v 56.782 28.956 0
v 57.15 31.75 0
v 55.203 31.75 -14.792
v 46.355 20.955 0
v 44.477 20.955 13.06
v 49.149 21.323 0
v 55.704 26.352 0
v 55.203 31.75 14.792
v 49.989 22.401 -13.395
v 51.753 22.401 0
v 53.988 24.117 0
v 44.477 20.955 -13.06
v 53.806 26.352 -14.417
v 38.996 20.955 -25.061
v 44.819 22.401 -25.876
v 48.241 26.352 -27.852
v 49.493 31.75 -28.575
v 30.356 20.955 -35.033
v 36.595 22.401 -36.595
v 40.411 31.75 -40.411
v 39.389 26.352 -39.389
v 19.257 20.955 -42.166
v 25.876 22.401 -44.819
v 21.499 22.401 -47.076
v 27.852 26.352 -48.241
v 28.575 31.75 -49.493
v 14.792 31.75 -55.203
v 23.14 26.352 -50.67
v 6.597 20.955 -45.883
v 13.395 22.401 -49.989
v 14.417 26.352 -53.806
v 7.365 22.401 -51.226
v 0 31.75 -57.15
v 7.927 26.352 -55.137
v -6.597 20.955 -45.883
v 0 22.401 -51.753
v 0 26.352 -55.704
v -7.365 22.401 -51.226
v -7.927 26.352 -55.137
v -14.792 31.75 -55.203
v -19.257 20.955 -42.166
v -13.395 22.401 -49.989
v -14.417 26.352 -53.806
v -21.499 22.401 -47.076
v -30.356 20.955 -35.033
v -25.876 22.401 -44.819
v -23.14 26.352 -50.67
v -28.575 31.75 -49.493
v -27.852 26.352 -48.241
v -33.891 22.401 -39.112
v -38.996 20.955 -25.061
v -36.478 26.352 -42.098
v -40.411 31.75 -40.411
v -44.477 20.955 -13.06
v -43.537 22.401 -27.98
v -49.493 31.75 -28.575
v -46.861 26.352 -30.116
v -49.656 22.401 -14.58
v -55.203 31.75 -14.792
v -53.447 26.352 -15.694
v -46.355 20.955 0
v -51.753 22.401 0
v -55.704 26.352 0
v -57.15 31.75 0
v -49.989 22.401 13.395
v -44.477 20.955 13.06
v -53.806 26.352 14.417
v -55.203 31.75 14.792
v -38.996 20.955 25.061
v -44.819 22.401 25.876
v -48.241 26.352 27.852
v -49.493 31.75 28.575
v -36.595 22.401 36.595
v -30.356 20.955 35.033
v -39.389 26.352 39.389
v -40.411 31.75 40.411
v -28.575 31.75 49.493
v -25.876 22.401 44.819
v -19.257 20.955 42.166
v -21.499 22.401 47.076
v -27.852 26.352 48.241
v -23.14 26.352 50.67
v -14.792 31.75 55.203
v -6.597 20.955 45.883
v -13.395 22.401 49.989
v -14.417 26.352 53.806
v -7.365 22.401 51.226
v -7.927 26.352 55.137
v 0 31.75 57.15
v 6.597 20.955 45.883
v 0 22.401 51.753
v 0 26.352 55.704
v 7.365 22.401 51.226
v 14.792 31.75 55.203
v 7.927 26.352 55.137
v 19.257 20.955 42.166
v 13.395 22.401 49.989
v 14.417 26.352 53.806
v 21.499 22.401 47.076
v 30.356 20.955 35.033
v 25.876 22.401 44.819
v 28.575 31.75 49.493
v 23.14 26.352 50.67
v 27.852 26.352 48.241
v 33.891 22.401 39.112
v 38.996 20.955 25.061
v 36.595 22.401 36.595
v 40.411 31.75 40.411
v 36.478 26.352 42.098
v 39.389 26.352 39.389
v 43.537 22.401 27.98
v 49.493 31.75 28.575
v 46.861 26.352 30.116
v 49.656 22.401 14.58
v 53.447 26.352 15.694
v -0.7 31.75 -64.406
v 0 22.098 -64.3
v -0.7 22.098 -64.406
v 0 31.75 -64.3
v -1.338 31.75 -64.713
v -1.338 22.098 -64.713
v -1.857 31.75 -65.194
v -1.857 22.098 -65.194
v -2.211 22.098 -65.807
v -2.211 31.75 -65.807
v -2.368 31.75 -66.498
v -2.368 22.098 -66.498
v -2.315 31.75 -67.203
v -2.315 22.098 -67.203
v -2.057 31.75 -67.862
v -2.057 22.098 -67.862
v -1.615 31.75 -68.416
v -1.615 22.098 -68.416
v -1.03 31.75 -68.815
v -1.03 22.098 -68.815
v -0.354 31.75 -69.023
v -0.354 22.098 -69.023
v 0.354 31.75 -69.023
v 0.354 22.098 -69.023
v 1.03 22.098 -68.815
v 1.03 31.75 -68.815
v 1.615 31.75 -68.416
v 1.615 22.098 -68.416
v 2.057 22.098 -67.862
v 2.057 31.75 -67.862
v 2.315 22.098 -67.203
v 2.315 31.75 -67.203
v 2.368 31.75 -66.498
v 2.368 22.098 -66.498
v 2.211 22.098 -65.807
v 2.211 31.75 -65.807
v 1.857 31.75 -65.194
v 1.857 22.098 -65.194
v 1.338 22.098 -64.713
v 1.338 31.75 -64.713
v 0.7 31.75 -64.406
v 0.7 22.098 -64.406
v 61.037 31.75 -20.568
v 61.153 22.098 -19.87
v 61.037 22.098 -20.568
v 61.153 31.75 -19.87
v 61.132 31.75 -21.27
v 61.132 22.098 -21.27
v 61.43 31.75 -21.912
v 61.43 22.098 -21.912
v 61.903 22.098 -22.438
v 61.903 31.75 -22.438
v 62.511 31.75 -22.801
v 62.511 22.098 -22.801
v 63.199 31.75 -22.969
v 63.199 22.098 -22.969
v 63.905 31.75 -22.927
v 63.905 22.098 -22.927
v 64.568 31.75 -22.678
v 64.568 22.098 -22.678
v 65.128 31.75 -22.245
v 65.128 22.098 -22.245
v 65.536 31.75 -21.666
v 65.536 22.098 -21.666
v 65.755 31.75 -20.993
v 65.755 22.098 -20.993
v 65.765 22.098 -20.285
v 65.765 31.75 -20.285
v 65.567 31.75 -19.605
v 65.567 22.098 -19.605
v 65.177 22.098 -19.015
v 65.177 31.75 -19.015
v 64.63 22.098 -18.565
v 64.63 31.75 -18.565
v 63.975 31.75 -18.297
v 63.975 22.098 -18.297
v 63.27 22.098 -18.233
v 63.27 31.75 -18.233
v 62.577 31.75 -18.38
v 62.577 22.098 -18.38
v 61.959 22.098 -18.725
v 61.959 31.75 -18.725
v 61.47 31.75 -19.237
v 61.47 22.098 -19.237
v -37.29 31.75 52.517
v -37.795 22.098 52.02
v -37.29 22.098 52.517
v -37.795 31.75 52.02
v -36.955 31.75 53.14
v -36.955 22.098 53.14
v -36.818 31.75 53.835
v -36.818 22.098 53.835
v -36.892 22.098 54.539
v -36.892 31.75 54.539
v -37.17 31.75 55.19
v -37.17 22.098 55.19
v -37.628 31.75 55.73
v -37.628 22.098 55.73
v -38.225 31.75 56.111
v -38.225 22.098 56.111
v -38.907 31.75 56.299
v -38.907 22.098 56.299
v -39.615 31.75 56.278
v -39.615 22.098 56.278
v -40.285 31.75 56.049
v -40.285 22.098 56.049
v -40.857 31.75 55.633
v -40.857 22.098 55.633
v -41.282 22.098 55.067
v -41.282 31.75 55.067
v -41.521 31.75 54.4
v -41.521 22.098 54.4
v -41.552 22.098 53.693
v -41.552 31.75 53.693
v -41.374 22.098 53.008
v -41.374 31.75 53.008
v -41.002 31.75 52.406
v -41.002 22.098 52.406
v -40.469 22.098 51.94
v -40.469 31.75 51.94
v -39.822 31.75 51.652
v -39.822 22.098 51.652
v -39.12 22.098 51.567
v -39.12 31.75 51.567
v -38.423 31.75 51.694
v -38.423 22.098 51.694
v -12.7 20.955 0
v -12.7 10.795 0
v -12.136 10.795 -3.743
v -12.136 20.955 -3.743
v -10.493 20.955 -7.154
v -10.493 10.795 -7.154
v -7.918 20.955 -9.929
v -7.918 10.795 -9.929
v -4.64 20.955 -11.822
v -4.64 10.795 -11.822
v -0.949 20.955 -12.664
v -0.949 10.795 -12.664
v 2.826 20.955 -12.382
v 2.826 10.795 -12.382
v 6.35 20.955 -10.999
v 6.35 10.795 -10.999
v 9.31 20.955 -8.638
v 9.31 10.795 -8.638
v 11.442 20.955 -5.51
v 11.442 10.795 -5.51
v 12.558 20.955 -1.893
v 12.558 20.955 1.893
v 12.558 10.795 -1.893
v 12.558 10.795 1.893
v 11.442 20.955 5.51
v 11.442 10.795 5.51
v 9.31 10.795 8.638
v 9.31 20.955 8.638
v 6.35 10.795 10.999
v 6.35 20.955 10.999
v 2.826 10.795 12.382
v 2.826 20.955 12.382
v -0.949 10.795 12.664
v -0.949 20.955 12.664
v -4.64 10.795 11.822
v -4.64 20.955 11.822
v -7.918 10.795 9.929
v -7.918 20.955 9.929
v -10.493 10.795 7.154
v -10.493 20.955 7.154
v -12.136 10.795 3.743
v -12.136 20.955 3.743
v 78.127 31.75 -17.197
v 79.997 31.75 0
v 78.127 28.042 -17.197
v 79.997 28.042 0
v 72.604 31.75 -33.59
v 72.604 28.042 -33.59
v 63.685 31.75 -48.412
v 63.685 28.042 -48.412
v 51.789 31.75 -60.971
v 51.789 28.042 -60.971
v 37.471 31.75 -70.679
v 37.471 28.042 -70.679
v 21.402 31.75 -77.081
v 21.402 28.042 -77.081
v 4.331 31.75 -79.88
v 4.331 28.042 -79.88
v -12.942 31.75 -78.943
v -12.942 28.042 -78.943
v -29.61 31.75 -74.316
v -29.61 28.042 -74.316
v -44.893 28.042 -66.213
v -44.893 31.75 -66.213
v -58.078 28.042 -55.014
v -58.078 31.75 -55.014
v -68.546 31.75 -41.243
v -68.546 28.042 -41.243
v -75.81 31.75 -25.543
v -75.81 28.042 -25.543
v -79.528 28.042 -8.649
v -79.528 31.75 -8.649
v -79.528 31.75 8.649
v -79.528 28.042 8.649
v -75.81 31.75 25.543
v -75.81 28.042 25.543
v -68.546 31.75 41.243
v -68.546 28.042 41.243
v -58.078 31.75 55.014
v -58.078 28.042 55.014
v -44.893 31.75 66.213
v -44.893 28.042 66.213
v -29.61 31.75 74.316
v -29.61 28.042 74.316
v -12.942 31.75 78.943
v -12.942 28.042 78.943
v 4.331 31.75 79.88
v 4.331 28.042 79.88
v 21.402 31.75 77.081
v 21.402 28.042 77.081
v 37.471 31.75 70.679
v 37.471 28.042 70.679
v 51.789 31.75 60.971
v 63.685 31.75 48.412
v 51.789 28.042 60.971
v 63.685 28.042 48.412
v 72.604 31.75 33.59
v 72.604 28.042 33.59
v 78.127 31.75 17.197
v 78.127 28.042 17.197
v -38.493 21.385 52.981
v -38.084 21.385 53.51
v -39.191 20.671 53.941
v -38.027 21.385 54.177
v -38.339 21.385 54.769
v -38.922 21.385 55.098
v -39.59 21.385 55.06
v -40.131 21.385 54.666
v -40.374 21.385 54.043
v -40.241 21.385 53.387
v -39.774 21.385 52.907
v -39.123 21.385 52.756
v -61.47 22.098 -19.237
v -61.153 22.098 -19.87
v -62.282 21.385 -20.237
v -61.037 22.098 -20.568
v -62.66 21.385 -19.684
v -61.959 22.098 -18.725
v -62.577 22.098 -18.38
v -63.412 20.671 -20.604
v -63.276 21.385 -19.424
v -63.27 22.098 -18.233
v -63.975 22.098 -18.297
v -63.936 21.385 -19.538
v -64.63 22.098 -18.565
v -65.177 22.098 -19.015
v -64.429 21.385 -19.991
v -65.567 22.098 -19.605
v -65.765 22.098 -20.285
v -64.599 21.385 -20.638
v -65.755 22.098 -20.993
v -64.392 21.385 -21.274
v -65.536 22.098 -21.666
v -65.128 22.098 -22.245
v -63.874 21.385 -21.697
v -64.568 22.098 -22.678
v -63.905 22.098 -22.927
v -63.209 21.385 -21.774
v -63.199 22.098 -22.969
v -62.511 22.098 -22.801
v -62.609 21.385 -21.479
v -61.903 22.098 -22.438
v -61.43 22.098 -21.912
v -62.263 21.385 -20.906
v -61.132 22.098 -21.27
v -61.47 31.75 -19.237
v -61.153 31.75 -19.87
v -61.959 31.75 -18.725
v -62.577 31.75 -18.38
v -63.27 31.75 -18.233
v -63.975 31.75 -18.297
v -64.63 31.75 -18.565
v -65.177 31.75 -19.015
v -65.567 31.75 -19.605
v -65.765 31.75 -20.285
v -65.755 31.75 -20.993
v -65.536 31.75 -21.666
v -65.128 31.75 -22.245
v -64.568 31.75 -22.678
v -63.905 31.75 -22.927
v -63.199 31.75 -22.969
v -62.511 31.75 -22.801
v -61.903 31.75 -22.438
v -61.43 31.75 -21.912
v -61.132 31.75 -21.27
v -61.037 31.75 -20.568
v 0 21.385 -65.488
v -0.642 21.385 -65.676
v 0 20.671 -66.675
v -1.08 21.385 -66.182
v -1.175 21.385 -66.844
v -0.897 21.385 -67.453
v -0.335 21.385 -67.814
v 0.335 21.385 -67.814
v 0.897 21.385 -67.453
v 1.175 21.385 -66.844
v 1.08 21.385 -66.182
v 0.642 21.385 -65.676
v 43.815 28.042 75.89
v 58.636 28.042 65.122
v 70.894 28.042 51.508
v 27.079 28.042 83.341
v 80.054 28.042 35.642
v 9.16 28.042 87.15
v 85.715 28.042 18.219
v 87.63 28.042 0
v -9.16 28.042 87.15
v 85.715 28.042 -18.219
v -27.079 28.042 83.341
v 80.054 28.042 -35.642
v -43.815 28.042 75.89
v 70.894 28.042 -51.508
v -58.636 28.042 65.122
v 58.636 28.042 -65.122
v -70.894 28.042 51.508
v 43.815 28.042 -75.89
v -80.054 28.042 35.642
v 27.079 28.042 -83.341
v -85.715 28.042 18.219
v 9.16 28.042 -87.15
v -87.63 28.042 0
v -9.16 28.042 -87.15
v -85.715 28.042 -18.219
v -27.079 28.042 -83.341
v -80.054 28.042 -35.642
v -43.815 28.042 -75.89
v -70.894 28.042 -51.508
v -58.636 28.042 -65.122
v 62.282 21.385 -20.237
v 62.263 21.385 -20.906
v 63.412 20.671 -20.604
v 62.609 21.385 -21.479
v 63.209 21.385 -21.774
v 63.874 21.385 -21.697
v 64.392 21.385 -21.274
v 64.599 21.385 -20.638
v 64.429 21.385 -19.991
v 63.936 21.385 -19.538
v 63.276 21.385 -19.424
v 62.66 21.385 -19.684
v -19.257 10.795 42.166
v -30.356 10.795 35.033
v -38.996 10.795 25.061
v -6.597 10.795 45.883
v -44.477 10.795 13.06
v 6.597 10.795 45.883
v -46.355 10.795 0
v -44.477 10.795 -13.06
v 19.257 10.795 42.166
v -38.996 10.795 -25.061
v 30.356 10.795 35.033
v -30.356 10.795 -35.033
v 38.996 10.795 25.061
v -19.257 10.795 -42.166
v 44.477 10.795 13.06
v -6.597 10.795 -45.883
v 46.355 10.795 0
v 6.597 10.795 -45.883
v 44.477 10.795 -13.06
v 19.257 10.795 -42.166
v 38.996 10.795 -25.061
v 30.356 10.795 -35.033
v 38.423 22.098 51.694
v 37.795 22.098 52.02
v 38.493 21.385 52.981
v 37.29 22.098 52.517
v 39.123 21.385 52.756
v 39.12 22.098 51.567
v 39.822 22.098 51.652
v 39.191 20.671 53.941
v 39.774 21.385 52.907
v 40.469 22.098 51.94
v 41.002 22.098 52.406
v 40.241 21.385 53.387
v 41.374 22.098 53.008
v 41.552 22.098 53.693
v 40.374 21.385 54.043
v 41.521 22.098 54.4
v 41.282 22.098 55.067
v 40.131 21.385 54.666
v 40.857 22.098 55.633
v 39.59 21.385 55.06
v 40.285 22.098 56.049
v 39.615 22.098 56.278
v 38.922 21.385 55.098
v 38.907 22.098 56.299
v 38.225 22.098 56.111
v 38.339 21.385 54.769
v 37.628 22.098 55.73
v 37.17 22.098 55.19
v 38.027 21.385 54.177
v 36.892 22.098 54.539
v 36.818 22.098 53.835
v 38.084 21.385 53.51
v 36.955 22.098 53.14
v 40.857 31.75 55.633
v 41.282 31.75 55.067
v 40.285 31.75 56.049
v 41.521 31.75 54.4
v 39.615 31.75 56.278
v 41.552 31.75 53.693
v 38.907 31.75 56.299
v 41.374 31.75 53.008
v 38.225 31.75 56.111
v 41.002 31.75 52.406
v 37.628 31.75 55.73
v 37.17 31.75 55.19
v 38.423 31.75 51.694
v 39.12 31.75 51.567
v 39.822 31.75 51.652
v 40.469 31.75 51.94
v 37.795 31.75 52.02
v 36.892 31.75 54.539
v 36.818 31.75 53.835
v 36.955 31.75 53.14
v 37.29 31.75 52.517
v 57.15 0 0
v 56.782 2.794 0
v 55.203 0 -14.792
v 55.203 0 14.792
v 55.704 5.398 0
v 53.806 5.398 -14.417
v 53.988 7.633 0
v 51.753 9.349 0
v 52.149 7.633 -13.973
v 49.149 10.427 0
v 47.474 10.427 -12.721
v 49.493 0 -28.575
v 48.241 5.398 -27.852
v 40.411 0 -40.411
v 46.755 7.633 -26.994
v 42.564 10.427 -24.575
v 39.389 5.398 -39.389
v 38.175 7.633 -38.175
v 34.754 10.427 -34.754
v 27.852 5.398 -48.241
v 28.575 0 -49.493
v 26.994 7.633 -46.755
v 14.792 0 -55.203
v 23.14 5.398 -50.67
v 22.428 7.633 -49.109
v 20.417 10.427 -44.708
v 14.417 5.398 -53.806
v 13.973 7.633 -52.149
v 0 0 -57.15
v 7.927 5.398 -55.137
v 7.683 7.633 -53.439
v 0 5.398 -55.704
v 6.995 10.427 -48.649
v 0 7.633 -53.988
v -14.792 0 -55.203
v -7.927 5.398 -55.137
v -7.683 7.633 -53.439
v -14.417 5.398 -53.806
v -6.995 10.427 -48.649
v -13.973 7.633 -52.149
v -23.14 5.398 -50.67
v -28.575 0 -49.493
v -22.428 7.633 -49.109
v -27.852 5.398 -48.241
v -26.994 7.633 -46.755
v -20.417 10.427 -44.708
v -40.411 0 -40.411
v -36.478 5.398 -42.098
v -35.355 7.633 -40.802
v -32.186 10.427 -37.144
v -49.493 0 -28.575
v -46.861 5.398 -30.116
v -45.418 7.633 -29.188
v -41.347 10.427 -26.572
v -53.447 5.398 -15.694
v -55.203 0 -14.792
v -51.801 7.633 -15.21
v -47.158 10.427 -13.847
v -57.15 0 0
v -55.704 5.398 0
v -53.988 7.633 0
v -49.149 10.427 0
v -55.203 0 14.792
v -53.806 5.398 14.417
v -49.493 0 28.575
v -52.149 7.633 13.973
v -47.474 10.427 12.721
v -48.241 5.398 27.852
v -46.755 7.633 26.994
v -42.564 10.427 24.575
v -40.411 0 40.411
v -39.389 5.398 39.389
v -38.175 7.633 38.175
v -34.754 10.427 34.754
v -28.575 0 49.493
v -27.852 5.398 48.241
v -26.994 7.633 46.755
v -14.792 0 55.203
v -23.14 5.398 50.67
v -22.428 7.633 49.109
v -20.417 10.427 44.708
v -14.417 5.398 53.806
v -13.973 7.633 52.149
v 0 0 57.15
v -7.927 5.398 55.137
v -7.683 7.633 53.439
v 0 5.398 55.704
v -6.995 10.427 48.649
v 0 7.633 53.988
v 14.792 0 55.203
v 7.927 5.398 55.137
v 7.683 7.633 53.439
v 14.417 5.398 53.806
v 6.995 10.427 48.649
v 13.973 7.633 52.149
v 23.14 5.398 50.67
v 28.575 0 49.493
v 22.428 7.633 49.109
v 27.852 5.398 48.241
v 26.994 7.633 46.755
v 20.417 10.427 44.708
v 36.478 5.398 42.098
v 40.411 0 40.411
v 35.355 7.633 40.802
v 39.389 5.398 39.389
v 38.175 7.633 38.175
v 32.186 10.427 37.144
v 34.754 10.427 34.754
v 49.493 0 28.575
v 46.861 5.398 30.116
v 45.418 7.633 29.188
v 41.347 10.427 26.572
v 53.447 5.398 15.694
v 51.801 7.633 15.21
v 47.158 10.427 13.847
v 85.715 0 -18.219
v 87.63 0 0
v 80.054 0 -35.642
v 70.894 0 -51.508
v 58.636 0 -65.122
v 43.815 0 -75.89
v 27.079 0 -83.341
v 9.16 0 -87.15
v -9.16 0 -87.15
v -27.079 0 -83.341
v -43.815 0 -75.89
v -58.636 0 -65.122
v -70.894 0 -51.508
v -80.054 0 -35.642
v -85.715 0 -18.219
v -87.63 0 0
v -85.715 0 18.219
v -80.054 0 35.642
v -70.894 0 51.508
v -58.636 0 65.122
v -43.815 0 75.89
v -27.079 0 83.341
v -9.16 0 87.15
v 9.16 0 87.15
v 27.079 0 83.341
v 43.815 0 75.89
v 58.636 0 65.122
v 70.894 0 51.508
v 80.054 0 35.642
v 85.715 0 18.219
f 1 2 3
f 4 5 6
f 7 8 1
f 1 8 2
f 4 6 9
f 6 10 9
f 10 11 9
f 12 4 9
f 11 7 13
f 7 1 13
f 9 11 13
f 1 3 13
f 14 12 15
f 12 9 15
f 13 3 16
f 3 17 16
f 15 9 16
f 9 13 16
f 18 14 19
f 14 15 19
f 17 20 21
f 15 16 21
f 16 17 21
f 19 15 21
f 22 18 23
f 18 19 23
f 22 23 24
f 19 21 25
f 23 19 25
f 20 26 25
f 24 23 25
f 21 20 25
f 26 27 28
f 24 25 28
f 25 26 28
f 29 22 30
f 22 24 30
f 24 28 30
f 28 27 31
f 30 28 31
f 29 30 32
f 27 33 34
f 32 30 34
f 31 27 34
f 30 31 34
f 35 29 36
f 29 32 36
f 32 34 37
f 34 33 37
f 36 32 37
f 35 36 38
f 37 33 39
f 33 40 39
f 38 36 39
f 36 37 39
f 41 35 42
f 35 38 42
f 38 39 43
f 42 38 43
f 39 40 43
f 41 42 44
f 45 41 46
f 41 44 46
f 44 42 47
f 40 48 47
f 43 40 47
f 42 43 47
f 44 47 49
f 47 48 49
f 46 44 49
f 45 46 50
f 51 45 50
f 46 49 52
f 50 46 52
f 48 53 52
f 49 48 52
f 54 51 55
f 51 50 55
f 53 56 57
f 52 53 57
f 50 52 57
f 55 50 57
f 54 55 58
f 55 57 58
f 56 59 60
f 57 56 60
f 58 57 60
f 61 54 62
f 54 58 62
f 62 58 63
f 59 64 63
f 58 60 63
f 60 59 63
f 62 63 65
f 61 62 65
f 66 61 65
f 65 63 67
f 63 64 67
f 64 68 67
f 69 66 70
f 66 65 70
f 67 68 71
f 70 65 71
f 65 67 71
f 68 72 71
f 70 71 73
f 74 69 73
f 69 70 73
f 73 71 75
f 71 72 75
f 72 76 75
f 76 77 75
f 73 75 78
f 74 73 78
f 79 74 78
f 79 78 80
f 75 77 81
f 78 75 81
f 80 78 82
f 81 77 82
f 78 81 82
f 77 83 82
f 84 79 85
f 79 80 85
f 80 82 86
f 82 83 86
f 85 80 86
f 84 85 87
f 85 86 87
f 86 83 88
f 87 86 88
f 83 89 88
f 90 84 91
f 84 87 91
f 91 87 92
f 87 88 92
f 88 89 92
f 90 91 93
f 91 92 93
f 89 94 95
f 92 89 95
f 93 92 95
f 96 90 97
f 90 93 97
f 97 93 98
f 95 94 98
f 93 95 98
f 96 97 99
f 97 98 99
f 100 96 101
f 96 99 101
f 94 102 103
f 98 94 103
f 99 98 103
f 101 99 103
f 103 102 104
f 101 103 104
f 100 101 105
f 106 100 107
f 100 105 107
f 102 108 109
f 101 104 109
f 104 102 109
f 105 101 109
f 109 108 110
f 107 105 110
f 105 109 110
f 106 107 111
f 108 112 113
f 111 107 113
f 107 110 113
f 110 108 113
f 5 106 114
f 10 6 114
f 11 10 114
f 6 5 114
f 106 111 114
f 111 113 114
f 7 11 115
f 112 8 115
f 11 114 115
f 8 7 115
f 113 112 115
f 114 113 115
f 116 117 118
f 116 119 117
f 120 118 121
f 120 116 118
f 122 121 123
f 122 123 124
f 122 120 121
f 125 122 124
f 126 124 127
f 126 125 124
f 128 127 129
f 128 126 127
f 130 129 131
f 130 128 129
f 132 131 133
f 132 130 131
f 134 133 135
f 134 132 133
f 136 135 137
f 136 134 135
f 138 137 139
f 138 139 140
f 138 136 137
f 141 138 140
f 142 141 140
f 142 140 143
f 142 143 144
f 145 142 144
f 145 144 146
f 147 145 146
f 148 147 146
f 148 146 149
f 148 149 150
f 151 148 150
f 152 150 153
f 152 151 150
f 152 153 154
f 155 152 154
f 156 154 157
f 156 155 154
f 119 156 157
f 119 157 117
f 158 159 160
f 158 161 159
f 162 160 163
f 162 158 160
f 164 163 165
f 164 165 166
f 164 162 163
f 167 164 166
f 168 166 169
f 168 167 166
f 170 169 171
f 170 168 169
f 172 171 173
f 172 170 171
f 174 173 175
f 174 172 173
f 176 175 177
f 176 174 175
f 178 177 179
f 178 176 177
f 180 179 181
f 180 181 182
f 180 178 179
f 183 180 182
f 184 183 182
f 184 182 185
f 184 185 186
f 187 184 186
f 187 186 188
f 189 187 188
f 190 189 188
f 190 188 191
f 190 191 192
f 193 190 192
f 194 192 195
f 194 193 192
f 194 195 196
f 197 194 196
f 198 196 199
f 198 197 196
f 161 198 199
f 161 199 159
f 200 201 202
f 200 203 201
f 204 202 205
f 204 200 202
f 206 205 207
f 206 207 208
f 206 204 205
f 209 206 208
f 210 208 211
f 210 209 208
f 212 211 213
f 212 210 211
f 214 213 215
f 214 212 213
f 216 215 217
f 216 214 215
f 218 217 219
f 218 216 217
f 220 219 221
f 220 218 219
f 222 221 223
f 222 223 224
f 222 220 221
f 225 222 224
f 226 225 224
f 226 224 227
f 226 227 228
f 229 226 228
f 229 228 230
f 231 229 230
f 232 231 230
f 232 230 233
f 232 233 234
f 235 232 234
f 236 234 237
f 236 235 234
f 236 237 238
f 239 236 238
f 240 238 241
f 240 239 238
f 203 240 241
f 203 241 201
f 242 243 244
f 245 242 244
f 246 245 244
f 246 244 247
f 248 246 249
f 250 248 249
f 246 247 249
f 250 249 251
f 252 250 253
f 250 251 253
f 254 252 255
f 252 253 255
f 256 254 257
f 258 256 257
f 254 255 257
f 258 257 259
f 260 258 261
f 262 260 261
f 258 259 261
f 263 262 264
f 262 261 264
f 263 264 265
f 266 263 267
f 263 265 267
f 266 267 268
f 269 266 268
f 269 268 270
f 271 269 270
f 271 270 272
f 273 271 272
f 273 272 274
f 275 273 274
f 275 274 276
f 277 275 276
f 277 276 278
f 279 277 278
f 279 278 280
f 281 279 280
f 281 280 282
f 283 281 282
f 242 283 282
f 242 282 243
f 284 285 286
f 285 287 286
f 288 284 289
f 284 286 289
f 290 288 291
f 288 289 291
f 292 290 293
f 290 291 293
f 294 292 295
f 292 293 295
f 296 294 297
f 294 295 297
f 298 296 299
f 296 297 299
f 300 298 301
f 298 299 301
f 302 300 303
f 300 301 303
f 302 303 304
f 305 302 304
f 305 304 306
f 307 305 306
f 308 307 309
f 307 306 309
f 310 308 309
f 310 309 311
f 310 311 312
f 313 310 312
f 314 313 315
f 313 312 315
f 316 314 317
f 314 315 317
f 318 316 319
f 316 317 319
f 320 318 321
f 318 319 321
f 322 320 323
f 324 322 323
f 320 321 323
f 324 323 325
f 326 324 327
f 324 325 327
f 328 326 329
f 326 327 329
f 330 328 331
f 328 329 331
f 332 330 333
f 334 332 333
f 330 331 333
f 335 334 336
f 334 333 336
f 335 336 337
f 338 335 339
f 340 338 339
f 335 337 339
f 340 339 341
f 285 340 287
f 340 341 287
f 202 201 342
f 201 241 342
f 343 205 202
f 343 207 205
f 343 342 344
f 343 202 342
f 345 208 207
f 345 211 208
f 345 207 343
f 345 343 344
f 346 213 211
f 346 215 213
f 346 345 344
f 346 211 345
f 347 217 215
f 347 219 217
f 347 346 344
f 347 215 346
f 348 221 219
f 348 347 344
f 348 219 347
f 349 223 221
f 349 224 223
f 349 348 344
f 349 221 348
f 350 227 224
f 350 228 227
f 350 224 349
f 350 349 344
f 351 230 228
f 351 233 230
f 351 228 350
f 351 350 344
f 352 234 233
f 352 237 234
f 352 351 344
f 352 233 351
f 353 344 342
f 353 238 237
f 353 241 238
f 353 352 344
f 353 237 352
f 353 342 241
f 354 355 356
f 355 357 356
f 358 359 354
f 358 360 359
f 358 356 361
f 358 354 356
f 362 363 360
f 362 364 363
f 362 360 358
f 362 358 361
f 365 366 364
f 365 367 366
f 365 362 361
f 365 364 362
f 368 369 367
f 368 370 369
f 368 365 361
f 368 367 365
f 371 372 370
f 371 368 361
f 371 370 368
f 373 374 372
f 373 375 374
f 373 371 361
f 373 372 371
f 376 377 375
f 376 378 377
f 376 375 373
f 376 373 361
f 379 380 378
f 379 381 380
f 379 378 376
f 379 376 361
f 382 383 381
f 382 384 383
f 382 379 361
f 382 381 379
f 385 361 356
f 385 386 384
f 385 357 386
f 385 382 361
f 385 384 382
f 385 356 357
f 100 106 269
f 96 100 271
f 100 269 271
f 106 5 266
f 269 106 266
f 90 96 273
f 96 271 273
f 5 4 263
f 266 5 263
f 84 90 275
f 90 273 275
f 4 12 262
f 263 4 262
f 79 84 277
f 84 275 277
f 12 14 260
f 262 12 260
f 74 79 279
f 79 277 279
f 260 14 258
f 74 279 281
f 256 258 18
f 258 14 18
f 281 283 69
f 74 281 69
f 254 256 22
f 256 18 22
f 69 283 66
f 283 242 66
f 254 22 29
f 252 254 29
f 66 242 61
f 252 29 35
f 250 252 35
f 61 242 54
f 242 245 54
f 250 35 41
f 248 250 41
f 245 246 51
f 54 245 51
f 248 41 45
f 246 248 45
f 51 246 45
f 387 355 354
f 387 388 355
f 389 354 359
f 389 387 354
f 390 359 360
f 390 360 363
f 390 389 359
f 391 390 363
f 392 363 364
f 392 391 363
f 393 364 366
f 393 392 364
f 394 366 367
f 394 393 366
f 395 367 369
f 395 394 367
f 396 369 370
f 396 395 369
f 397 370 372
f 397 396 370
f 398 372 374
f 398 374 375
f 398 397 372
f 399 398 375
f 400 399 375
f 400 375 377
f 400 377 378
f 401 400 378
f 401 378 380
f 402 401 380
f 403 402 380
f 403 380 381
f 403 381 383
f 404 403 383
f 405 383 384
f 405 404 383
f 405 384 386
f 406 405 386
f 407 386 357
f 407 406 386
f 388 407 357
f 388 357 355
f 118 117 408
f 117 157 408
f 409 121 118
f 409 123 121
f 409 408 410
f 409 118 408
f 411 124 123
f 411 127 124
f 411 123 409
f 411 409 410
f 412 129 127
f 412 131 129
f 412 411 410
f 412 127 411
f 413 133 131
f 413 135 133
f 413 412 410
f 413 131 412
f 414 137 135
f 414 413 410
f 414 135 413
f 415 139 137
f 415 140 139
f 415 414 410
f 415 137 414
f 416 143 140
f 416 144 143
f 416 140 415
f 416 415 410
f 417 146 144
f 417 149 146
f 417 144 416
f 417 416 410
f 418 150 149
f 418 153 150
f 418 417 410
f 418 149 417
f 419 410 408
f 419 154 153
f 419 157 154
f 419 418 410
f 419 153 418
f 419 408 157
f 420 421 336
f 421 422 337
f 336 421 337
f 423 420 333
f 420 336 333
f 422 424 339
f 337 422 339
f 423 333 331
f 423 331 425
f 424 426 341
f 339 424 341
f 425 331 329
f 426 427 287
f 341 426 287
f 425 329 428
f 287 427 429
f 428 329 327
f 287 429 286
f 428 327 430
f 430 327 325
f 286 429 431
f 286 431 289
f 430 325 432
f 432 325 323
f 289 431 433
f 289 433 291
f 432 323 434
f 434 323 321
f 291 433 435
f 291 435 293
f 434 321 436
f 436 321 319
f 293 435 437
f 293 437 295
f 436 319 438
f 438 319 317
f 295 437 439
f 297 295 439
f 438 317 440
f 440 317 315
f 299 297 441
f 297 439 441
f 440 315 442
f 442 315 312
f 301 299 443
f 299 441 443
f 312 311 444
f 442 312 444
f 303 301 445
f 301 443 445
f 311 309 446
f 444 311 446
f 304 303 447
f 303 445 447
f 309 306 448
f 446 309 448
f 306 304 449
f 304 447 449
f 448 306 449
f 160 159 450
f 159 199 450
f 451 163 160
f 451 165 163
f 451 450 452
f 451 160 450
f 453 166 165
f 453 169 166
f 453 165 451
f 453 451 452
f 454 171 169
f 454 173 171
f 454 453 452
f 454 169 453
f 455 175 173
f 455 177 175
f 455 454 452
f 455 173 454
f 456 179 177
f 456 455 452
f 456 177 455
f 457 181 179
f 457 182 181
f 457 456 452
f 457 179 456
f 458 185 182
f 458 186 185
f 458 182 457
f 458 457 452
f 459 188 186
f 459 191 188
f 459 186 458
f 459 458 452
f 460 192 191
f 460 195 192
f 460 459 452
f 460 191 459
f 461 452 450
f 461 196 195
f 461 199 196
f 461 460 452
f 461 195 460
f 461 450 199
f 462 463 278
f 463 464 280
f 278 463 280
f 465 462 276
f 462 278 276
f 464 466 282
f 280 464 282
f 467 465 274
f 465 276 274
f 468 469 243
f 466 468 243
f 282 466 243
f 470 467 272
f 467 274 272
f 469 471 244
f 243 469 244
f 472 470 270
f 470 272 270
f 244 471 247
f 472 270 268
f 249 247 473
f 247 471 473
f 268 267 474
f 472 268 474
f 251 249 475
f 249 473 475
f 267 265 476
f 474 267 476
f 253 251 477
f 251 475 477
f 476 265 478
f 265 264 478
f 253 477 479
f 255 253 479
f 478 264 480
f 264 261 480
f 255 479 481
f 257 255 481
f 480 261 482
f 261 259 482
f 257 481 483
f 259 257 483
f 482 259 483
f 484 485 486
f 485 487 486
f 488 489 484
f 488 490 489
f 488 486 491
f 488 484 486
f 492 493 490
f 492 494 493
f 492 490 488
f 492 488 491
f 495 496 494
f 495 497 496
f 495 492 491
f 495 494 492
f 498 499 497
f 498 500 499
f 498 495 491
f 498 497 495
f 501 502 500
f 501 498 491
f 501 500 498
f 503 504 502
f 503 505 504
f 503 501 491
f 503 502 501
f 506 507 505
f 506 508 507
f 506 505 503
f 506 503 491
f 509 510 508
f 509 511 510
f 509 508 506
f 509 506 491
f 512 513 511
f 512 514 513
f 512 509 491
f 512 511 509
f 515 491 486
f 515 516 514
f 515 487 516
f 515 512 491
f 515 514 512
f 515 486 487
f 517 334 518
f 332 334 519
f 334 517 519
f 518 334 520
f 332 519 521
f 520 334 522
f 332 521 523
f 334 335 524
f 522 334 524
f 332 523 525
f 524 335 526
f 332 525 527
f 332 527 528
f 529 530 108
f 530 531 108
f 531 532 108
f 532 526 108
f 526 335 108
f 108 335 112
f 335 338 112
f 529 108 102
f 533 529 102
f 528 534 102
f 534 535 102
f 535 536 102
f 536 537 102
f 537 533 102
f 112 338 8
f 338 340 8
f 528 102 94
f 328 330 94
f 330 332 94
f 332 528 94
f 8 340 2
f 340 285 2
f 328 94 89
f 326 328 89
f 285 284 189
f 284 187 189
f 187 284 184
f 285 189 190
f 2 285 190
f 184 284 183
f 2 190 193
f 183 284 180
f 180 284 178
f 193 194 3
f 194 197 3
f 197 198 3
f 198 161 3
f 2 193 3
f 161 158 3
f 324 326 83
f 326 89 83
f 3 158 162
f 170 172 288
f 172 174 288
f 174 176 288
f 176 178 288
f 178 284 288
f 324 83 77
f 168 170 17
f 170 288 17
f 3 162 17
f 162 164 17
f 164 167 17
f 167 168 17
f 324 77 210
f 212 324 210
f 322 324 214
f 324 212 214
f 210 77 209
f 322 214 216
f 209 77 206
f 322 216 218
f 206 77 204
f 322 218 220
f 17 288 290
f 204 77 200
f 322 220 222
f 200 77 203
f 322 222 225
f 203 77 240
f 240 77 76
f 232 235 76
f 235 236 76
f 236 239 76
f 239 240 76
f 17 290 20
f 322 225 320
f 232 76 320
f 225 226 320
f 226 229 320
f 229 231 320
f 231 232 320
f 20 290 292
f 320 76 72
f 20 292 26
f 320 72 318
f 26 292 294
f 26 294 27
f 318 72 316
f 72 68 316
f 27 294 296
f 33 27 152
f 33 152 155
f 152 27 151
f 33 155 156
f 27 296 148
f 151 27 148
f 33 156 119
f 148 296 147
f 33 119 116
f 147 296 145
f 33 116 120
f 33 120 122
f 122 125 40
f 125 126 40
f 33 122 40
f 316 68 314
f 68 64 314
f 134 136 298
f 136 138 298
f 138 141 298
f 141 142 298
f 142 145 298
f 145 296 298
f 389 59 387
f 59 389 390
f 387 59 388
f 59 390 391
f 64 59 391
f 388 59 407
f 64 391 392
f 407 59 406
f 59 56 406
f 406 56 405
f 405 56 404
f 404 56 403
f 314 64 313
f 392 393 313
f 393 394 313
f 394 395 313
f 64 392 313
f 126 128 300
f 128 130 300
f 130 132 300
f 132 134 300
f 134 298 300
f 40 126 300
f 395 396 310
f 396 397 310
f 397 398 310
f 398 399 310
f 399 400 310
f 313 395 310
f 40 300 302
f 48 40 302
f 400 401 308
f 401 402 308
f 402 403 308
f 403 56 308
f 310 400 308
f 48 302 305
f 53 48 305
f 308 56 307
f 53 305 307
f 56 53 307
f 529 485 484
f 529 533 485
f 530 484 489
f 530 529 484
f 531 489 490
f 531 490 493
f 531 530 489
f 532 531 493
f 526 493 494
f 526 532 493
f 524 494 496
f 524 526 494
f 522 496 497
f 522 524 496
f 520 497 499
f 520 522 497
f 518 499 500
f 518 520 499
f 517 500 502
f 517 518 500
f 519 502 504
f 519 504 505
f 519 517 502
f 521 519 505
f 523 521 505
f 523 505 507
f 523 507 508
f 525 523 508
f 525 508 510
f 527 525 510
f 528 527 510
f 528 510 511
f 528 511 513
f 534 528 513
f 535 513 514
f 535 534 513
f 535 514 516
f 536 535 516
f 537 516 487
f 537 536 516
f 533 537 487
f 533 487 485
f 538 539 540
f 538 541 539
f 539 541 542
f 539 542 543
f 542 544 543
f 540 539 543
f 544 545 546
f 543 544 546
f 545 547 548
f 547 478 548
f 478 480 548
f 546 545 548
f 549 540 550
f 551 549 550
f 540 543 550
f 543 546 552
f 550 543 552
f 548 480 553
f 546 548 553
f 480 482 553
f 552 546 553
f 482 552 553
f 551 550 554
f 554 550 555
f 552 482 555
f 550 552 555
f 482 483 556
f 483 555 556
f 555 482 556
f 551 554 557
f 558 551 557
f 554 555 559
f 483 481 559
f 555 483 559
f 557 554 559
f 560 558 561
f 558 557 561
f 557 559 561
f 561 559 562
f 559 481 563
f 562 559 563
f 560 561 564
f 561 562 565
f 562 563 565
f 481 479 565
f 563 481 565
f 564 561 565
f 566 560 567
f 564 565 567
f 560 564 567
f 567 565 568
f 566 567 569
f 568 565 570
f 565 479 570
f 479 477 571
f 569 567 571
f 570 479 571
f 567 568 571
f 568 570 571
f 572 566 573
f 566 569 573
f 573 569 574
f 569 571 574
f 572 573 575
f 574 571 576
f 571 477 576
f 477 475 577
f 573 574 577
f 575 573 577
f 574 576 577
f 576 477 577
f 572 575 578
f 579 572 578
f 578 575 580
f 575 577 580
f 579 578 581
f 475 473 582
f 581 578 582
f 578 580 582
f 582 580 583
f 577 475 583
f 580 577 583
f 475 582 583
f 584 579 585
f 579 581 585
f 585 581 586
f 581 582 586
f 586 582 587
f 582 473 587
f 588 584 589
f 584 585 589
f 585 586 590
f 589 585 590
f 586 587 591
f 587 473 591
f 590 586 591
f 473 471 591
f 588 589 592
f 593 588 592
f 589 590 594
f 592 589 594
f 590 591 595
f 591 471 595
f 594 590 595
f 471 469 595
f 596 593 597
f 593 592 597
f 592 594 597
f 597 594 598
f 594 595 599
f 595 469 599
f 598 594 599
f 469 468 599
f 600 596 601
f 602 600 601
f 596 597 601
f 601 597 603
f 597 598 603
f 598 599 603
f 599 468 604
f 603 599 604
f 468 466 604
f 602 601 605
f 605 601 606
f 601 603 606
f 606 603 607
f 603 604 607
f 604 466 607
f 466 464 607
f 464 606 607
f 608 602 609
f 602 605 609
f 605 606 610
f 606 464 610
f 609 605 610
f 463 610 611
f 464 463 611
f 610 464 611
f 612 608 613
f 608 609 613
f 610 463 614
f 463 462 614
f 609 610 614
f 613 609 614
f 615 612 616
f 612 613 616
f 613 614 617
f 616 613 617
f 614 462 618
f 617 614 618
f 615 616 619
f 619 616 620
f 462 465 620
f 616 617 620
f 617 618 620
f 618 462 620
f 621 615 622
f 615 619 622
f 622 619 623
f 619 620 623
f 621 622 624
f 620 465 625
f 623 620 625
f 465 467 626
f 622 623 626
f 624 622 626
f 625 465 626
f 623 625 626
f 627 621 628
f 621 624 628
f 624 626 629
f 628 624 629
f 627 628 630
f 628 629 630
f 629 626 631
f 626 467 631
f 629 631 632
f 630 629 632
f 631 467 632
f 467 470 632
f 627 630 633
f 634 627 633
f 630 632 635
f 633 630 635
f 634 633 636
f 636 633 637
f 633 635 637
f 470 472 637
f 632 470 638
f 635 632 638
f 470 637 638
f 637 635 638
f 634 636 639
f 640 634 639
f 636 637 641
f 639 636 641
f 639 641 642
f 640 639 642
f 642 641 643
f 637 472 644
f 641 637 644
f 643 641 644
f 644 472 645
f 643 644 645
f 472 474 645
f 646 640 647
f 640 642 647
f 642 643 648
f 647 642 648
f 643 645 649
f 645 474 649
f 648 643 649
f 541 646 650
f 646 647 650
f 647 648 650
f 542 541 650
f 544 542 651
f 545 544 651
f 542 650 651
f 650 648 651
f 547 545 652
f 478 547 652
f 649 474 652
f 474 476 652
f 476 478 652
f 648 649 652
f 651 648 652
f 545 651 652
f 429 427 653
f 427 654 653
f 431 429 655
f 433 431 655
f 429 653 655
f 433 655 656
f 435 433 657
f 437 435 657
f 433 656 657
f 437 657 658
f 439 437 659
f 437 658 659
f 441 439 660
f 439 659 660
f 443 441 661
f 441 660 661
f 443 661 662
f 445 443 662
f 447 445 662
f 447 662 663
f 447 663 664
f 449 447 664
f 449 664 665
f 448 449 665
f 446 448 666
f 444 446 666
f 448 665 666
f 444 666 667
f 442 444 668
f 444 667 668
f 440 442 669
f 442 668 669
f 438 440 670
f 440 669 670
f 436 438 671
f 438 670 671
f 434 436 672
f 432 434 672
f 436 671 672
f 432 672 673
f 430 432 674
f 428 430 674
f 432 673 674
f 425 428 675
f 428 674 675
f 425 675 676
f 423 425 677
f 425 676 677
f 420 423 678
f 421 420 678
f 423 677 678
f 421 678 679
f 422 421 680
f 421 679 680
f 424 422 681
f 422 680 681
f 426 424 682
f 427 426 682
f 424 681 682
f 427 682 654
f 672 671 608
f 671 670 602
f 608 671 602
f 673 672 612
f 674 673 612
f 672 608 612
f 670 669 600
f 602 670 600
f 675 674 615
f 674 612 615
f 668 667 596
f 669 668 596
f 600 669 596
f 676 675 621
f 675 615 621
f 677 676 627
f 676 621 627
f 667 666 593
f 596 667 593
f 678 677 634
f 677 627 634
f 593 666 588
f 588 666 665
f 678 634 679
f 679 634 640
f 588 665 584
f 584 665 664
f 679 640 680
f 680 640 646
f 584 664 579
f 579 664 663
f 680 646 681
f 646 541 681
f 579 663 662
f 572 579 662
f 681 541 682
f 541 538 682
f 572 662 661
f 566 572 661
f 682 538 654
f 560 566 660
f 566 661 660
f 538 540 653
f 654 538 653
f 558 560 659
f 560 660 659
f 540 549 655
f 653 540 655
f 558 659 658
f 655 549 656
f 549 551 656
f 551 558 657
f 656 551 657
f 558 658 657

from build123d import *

# Parameters (mm, degrees)
F_1_1_DIAMETER_HOLE1_D = 25.4
CIRPATTERN1_COUNT      = 5
FILLET2_R              = 10.795


with BuildPart() as part:
    # Sketch1 → Revolve1 (revolve)
    with BuildSketch(Plane.XY):
        Polygon((87.63, 0), (57.15, 0), (57.15, 10.795), (0, 10.795), (0, 20.955), (57.15, 20.955), (57.15, 31.75), (79.9973, 31.75), (79.9973, 28.0416), (87.63, 28.0416), align=None)
    revolve(axis=Axis((0, 10.795, 0), (0, 1, 0)))

    # 1 (1) Diameter Hole1 (through all)
    with Locations(Plane(origin=(0, 20.955, 0), x_dir=(1, 0, 0), z_dir=(0, 1, 0))):
        with Locations((0, 0)):
            Hole(F_1_1_DIAMETER_HOLE1_D / 2)

    # Sketch7 → 3/16 (0.187) Dowel Hole1 (revolve, cut)
    with BuildSketch(Plane(origin=(0, 31.75, -66.675), x_dir=(0, 0, 1), z_dir=(1, 0, 0))):
        Polygon((0, 0), (0, 11.078983884), (2.3749, 9.652), (2.3749, 0), align=None)
    f_3_16_0_187_dowel_hole1 = revolve(axis=Axis((0, 38.1, -66.675), (0, -1, 0)), mode=Mode.SUBTRACT)

    # CirPattern1: 3/16 (0.187) Dowel Hole1 ×5 about axis
    cirpattern1_axis = Axis((0, 0, 0), (0, 1, 0))
    for i in range(1, CIRPATTERN1_COUNT):
        add(f_3_16_0_187_dowel_hole1.rotate(cirpattern1_axis, i * 360 / CIRPATTERN1_COUNT), mode=Mode.SUBTRACT)

    # Fillet2
    fillet2_edges = [part.edges().sort_by_distance(p)[0] for p in [
        (-57.15, 10.795, 0),
        (-57.15, 20.955, 0),
    ]]
    fillet(fillet2_edges, radius=FILLET2_R - 0.0001)  # a hair under: the kernel refuses the full size


solid = part.part
